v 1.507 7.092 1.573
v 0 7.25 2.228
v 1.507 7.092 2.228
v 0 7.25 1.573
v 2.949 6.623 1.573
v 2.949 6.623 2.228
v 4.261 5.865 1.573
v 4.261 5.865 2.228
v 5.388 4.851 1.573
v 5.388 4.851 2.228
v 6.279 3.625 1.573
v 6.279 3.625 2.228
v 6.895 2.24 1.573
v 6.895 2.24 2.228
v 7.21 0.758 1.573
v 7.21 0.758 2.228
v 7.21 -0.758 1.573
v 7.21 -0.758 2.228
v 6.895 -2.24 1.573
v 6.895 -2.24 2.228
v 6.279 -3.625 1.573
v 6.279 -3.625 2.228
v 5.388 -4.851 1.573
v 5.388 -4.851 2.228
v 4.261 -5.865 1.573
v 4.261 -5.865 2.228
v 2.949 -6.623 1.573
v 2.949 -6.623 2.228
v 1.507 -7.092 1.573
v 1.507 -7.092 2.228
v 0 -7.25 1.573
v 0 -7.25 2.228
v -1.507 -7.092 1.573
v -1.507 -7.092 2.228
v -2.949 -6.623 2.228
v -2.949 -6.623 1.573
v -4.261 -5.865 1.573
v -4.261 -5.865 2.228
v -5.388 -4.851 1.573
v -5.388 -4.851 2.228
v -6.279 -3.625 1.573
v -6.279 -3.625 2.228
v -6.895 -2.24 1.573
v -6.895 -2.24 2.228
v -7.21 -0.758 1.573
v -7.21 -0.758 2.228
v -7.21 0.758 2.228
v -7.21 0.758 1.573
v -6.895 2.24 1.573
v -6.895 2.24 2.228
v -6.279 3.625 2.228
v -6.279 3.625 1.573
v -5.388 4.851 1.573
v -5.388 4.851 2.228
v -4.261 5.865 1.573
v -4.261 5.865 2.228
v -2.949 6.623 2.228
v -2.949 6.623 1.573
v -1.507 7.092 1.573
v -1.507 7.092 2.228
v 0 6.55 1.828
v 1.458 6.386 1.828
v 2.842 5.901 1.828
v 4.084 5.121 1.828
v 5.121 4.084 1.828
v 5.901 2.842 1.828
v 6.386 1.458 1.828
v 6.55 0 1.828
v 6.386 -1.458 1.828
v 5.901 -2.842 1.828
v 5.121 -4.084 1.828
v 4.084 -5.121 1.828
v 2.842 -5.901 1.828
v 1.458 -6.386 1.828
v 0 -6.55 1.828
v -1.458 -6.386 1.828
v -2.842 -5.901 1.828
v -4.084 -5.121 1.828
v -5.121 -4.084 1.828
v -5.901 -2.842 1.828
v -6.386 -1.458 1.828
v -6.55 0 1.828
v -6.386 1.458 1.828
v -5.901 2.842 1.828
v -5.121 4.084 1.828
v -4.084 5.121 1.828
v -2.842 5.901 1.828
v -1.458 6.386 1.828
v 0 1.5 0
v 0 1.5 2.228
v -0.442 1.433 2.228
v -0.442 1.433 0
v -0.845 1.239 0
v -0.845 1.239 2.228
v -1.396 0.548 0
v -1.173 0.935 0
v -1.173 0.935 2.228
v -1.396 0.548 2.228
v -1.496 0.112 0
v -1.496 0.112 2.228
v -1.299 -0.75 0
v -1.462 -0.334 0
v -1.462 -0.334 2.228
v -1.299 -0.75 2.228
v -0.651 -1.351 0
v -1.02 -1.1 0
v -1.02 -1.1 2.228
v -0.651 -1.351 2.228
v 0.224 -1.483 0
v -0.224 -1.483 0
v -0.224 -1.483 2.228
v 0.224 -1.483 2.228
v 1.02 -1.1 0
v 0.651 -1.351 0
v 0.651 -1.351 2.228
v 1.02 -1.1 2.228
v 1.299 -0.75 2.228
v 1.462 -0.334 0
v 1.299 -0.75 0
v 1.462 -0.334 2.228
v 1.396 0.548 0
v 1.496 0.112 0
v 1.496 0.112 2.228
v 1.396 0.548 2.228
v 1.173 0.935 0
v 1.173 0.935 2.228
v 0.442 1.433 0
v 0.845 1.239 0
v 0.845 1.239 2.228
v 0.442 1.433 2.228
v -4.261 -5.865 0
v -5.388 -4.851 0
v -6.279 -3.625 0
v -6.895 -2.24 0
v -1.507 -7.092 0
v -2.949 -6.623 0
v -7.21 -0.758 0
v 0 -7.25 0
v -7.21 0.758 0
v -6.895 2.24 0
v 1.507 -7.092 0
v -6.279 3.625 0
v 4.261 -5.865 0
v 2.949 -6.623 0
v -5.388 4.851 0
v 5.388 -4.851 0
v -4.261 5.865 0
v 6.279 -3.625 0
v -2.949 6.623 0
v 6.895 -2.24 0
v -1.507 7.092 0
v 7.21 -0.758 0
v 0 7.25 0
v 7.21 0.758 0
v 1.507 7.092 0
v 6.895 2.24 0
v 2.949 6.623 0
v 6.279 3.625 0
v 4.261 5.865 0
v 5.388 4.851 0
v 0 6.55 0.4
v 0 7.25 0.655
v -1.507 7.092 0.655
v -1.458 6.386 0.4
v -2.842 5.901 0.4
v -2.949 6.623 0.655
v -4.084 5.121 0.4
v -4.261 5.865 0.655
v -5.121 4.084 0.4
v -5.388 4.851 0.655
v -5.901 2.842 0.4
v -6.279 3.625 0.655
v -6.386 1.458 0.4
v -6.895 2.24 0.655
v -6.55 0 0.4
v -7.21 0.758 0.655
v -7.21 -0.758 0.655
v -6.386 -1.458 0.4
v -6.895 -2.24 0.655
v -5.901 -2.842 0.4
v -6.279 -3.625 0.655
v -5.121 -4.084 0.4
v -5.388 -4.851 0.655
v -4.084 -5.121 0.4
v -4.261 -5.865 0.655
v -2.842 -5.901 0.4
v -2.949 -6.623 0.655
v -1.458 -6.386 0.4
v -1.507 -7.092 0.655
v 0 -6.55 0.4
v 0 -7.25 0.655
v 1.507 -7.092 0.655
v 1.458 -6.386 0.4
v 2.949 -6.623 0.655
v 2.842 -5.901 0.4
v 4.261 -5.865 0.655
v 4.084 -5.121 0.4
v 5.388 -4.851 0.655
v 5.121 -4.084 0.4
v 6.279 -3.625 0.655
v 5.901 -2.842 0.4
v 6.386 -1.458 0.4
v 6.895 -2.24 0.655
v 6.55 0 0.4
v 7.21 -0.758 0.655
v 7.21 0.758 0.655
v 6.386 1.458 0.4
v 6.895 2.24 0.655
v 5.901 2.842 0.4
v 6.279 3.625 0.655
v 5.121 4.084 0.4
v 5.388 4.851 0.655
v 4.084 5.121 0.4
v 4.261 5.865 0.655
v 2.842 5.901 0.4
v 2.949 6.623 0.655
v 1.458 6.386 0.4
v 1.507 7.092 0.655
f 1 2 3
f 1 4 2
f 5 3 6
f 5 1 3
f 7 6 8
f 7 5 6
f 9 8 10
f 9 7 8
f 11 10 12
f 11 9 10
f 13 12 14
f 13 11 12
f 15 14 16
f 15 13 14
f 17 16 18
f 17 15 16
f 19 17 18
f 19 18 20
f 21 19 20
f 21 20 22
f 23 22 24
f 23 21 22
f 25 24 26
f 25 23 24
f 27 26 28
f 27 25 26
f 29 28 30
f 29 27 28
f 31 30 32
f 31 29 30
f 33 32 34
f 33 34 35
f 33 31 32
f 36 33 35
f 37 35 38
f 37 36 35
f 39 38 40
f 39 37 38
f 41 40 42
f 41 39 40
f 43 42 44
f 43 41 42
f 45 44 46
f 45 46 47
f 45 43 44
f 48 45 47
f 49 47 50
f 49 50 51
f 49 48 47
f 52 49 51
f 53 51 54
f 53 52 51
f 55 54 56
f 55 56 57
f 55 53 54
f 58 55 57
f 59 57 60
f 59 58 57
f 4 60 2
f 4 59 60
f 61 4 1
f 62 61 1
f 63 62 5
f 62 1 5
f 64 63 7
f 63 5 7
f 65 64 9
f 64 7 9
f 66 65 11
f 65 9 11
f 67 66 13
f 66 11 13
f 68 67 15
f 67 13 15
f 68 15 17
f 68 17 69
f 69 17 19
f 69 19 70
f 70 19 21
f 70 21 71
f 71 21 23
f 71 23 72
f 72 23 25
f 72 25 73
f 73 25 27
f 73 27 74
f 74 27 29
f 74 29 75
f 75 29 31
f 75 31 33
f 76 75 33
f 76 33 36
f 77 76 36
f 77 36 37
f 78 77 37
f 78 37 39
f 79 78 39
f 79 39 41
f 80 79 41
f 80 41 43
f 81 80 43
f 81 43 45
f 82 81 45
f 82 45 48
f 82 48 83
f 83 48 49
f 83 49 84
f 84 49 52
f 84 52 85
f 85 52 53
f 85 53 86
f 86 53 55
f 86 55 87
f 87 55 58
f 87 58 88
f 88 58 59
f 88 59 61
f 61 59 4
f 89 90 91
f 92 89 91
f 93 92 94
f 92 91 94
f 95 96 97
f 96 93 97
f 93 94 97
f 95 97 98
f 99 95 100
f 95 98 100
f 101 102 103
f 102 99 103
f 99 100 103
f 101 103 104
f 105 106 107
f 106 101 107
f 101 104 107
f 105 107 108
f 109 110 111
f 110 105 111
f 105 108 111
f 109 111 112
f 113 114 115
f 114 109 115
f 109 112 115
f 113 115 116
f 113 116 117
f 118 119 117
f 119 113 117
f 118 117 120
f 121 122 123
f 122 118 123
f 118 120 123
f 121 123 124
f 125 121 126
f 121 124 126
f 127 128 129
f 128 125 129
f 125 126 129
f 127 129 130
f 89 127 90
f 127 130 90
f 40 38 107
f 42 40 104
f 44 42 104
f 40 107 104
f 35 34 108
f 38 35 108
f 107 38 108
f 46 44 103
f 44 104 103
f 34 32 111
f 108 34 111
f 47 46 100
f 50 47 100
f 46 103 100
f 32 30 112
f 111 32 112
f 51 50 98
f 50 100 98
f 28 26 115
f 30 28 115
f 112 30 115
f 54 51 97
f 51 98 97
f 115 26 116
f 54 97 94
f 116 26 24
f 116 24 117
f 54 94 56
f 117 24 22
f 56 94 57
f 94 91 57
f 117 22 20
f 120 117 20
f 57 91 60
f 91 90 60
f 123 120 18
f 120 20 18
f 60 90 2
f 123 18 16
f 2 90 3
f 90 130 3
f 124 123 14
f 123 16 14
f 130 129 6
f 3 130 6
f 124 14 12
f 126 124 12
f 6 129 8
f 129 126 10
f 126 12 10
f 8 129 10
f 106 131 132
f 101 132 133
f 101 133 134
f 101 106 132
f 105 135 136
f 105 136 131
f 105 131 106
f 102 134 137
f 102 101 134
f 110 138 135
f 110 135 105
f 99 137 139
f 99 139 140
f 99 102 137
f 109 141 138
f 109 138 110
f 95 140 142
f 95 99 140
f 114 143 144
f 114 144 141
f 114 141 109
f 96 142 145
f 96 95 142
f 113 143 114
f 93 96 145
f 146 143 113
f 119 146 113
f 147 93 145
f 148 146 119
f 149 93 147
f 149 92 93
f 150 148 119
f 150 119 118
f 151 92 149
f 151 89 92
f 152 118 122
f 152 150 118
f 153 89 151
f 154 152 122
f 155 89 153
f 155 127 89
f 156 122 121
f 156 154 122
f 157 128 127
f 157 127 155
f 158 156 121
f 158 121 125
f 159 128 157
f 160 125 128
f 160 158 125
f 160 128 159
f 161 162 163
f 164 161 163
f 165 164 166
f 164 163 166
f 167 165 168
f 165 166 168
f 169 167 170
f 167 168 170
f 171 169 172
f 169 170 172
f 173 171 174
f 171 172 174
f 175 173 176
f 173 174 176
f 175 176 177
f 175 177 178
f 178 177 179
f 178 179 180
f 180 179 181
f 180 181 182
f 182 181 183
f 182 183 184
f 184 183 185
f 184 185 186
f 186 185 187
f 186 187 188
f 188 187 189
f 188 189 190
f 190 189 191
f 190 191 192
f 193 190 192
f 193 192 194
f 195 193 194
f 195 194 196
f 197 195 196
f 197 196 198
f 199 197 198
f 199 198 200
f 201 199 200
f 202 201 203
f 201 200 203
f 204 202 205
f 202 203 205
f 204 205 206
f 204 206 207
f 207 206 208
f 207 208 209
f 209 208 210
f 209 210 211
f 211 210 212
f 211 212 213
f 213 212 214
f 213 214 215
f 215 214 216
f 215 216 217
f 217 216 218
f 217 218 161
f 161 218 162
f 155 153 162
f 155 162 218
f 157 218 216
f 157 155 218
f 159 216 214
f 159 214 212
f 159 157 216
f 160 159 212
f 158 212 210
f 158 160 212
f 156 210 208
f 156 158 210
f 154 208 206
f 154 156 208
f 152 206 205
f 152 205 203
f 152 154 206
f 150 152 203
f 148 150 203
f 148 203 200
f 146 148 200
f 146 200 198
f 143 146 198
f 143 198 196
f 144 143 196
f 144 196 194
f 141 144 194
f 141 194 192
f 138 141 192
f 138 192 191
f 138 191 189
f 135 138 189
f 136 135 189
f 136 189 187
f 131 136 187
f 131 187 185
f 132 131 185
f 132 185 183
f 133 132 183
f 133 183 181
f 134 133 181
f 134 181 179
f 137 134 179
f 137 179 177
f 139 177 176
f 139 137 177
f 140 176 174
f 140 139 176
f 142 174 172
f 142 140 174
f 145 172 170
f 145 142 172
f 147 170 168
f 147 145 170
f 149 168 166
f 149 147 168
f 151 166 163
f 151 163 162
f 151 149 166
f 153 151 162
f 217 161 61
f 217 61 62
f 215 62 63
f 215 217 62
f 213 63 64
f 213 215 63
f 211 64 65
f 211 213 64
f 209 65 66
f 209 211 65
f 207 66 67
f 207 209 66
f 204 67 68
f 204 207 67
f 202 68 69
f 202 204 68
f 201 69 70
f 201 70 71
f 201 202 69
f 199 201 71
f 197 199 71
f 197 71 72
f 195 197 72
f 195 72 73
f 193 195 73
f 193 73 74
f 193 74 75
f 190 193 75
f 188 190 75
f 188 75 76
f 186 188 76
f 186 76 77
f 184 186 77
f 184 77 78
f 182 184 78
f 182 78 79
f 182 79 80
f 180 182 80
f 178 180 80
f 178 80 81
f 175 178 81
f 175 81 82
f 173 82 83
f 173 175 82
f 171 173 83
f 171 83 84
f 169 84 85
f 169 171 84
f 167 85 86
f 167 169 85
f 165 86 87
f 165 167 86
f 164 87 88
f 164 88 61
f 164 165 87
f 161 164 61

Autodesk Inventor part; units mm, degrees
ref_plane "YZ Plane" through (0, 0, 0) normal (1, 0, 0) x (0, 1, 0)
ref_plane "XZ Plane" through (0, 0, 0) normal (0, 1, 0) x (-1, 0, 0)
ref_plane "XY Plane" through (0, 0, 0) normal (0, 0, 1) x (1, 0, 0)
sketch "Esquisse2" plane through (0, 0, 0) normal (1, 0, 0) x (0, 1, 0)
  line L0 (0, 0) -> (0, -10.0642)
  line L1 (7.25, 2.2281) -> (7.25, 1.5734)
  line L2 (7.25, 1.5734) -> (6.55, 1.8281)
  line L3 (6.55, 1.8281) -> (6.55, 0.4)
  line L4 (6.55, 0.4) -> (7.25, 0.6548)
  line L5 (7.25, 0.6548) -> (7.25, 0)
  circle A0 centre (7.05, 1.1141) radius 0.5 construction
  line L6 (7.25, 2.2281) -> (1.5, 2.2281)
  line L7 (7.25, 0) -> (1.5, 0)
  line L8 (1.5, 0) -> (1.5, 2.2281)
  dimension "d1" = 1
  dimension "d2" = 70
  dimension "d3" = 70
  dimension "d4" = 0.2
  dimension "d5" = 14.5
  dimension "d7" = 0.4
  dimension "d8" = 0.4
  dimension "d9" = 3
revolve "Révolution1" add sketch "Esquisse2" angle 360 about axis through (0, 0, 0) along (0, 0, -1)
thread "Filetage1" size "M3x0.5" class "6H" standard "ISO Metric profile" full length
equation "\"d3\" = d2"
equation "\"d8\" = d7"
properties part number "piston_deplaceur"
